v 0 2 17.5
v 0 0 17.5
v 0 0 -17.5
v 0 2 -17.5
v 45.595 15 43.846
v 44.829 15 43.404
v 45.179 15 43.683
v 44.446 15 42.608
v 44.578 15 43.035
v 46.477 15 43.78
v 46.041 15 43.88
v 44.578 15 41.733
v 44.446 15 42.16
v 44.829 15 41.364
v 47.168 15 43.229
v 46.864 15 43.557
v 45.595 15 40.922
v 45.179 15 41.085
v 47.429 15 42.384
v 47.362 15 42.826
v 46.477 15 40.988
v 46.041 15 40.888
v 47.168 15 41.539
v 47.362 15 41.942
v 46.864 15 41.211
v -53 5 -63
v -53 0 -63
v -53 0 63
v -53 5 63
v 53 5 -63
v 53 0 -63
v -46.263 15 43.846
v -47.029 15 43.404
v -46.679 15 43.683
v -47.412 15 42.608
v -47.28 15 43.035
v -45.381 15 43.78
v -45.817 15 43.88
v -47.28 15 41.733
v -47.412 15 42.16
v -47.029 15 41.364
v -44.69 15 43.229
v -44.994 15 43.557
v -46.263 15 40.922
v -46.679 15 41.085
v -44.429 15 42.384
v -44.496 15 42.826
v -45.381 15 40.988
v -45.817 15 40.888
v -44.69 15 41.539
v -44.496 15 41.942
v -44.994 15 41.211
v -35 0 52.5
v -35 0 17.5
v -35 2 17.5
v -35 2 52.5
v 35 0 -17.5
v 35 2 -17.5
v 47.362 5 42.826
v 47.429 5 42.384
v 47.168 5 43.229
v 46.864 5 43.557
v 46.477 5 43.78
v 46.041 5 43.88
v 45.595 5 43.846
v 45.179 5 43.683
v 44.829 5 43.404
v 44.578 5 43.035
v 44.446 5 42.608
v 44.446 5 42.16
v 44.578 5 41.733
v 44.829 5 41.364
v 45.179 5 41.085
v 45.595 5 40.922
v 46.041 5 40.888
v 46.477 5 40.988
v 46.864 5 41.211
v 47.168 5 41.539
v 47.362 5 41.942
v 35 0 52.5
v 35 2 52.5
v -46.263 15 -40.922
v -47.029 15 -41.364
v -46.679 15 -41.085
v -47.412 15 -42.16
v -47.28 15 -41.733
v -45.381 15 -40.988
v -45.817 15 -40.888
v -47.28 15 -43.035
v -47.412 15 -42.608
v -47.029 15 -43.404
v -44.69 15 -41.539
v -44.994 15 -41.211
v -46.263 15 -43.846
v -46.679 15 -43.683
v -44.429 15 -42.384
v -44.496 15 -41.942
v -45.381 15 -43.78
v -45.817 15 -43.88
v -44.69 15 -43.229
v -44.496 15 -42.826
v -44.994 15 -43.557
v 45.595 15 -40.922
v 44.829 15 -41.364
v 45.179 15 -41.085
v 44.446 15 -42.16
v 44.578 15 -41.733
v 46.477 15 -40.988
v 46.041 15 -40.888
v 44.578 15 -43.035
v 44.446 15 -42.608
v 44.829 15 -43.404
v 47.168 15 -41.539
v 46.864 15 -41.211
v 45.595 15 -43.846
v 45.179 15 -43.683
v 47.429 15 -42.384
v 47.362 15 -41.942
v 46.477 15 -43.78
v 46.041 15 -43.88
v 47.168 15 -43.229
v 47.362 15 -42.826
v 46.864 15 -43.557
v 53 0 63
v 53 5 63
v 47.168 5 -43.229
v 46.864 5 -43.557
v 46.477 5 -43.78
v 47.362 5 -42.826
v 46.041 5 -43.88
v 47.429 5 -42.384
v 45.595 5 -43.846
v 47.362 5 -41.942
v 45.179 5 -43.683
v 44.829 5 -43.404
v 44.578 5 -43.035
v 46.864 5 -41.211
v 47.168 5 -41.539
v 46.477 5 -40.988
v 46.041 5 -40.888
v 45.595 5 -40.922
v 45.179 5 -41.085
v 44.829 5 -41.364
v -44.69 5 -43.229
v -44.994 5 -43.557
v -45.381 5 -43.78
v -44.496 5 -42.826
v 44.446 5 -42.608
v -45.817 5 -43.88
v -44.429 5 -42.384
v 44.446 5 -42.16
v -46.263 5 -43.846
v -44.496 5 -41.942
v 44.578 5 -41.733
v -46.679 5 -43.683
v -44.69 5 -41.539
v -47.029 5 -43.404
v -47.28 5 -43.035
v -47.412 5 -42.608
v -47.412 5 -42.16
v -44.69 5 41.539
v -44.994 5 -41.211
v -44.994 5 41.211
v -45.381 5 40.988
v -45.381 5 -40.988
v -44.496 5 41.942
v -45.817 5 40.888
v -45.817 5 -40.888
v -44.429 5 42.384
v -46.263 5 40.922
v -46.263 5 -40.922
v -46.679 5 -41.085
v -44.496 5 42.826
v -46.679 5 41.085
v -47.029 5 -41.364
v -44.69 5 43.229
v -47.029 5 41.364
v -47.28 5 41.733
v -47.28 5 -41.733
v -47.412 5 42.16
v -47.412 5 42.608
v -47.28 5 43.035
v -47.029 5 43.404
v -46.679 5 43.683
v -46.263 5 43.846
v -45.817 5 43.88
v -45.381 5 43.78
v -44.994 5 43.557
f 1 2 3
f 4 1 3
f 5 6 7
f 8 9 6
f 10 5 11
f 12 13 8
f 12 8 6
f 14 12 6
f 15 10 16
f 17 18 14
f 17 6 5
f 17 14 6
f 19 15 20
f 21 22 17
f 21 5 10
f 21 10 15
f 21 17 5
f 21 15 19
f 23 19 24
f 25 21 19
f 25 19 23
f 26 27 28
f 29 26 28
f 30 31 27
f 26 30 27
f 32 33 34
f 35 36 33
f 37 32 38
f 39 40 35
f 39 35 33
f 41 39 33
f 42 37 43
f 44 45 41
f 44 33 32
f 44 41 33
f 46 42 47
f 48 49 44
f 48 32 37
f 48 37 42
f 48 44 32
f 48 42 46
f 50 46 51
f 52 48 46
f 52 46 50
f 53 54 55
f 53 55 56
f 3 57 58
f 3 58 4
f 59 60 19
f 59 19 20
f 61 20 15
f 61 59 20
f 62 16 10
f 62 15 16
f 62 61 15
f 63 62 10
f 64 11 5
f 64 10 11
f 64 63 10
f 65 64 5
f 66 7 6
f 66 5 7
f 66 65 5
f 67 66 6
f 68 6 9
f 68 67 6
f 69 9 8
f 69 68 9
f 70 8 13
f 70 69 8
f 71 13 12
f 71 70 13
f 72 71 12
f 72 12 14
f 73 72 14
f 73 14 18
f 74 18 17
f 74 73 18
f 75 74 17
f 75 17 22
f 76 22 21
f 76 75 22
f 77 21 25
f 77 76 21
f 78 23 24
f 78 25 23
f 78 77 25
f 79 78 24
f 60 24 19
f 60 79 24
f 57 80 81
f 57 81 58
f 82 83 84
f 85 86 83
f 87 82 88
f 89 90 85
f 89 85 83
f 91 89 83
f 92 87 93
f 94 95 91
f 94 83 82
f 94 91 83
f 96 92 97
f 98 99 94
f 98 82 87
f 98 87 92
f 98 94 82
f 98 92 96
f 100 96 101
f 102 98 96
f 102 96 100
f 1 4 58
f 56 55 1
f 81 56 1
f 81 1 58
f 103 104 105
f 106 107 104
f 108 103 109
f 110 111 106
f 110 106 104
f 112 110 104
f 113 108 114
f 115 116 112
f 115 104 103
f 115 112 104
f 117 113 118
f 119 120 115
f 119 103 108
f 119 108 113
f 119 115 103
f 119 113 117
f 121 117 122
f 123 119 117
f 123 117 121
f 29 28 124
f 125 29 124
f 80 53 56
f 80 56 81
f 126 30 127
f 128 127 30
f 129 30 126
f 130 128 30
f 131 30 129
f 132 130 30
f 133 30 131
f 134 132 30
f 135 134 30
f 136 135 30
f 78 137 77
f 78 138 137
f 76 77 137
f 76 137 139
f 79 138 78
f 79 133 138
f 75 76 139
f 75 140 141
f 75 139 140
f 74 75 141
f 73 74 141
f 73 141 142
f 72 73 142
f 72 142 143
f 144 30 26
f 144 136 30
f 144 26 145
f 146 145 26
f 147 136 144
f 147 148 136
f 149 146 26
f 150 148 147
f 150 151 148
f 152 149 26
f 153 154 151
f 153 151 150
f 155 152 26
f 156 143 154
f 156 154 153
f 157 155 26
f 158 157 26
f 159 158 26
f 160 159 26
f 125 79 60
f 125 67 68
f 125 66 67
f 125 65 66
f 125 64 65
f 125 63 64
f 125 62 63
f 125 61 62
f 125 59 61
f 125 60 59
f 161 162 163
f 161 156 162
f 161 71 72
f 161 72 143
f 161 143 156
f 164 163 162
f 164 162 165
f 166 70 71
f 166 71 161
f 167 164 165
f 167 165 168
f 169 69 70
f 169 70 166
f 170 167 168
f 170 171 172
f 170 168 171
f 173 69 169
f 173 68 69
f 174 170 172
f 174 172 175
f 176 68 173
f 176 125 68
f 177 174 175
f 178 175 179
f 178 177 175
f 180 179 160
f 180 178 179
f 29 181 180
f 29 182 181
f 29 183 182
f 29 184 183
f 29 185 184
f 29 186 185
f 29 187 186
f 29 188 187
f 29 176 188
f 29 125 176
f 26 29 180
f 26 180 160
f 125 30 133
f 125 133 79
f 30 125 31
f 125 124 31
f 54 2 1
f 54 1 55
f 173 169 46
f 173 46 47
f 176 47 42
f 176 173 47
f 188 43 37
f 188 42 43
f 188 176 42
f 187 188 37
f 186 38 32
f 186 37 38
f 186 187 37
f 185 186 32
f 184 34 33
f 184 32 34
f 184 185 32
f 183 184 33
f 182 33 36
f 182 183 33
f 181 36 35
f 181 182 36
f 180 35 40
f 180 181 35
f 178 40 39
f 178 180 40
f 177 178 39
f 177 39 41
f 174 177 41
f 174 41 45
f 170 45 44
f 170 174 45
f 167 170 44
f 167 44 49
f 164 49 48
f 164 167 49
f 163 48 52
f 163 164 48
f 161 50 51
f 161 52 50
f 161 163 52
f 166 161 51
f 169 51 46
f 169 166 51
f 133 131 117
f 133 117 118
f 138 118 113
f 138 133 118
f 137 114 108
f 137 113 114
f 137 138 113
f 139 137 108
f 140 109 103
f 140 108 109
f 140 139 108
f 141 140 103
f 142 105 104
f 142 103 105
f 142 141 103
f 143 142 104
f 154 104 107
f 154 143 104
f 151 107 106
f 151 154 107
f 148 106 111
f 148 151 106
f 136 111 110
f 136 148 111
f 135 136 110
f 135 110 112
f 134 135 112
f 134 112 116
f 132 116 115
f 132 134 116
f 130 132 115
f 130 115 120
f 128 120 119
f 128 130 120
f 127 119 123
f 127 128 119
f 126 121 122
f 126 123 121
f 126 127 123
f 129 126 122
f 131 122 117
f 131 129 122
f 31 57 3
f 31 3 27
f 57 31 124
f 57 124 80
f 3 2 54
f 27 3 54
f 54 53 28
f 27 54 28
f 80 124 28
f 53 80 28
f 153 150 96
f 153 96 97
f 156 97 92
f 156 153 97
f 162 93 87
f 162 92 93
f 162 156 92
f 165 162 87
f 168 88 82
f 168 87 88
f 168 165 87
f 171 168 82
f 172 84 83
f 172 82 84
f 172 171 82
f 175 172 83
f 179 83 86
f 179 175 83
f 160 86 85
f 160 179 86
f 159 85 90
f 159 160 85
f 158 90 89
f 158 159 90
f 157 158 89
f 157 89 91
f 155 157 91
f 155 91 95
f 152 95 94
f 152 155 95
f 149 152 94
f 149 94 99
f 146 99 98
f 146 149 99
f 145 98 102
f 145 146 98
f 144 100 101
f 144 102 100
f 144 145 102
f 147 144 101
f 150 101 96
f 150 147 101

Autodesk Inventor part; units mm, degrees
ref_plane "YZ Plane" through (0, 0, 0) normal (1, 0, 0) x (0, 1, 0)
ref_plane "XZ Plane" through (0, 0, 0) normal (0, 1, 0) x (-1, 0, 0)
ref_plane "XY Plane" through (0, 0, 0) normal (0, 0, 1) x (1, 0, 0)
sketch "Boceto1" plane through (0, 0, 0) normal (0, 1, 0) x (-1, 0, 0)
  line L0 (53, 63) -> (-53, 63)
  line L1 (-53, 63) -> (-53, -63)
  line L2 (-53, -63) -> (53, -63)
  line L3 (53, -63) -> (53, 63)
  point P0 (0, 0)
  point P1 (0, 63)
  dimension "d1" = 106
  dimension "d2" = 126
  dimension "d3" = 53
  dimension "d4" = 63
extrude "Extrusión1" add sketch "Boceto1" along normal blind 5
sketch "Boceto2" plane through (0, 5, 0) normal (0, 1, 0) x (1, 0, 0)
  circle A0 centre (-45.929, -42.384) radius 1.5
  line L0 (-53, -63) -> (53, -63) projected
  line L1 (-53, 63) -> (-53, -63) projected
  line L2 (-81, 0) -> (77, 0)
  line L3 (0, -130) -> (0, 128)
  circle A1 centre (-45.929, 42.384) radius 1.5
  line L4 (-53, -63) -> (-53, 63)
  circle A2 centre (45.929, -42.384) radius 1.5
  circle A3 centre (45.929, 42.384) radius 1.5
  point P0 (0, 0)
  dimension "d7" = 3
  dimension "d8" = 20.616
  dimension "d9" = 7.071
extrude "Extrusión2" add sketch "Boceto2" along normal blind 10 contours A0 | A1 | A2 | A3
sketch "Boceto3" plane through (0, 0, 0) normal (0, -1, 0) x (1, 0, 0)
  line L0 (-35, 52.5) -> (35, 52.5)
  line L1 (35, 52.5) -> (35, -52.5)
  line L2 (35, -52.5) -> (-35, -52.5)
  line L3 (-35, -52.5) -> (-35, 52.5)
  line L4 (53, -63) -> (-53, -63) projected
  line L5 (-53, 63) -> (53, 63) projected
  line L6 (53, 63) -> (53, -63) projected
  line L7 (-53, -63) -> (-53, 63) projected
  line L8 (35, 17.5) -> (-35, 17.5)
  line L9 (35, -17.5) -> (-35, -17.5)
  line L10 (0, 52.5) -> (0, -52.5)
  point P0 (0, 0)
  point P1 (0, 17.5)
  point P2 (0, -17.5)
  dimension "d12" = 52.5
  dimension "d13" = 126
  dimension "d14" = 106
  dimension "d15" = 52.5
  dimension "d16" = 35
  dimension "d17" = 35
  dimension "d18" = 35
  dimension "d19" = 35
  dimension "d20" = 35
extrude "Extrusión3" cut sketch "Boceto3" against normal blind 2 contours L0 L10 L8 L3 | L0 L1 L8 L10 | L8 L1 L9 L10
properties part number "Tapa 0"
